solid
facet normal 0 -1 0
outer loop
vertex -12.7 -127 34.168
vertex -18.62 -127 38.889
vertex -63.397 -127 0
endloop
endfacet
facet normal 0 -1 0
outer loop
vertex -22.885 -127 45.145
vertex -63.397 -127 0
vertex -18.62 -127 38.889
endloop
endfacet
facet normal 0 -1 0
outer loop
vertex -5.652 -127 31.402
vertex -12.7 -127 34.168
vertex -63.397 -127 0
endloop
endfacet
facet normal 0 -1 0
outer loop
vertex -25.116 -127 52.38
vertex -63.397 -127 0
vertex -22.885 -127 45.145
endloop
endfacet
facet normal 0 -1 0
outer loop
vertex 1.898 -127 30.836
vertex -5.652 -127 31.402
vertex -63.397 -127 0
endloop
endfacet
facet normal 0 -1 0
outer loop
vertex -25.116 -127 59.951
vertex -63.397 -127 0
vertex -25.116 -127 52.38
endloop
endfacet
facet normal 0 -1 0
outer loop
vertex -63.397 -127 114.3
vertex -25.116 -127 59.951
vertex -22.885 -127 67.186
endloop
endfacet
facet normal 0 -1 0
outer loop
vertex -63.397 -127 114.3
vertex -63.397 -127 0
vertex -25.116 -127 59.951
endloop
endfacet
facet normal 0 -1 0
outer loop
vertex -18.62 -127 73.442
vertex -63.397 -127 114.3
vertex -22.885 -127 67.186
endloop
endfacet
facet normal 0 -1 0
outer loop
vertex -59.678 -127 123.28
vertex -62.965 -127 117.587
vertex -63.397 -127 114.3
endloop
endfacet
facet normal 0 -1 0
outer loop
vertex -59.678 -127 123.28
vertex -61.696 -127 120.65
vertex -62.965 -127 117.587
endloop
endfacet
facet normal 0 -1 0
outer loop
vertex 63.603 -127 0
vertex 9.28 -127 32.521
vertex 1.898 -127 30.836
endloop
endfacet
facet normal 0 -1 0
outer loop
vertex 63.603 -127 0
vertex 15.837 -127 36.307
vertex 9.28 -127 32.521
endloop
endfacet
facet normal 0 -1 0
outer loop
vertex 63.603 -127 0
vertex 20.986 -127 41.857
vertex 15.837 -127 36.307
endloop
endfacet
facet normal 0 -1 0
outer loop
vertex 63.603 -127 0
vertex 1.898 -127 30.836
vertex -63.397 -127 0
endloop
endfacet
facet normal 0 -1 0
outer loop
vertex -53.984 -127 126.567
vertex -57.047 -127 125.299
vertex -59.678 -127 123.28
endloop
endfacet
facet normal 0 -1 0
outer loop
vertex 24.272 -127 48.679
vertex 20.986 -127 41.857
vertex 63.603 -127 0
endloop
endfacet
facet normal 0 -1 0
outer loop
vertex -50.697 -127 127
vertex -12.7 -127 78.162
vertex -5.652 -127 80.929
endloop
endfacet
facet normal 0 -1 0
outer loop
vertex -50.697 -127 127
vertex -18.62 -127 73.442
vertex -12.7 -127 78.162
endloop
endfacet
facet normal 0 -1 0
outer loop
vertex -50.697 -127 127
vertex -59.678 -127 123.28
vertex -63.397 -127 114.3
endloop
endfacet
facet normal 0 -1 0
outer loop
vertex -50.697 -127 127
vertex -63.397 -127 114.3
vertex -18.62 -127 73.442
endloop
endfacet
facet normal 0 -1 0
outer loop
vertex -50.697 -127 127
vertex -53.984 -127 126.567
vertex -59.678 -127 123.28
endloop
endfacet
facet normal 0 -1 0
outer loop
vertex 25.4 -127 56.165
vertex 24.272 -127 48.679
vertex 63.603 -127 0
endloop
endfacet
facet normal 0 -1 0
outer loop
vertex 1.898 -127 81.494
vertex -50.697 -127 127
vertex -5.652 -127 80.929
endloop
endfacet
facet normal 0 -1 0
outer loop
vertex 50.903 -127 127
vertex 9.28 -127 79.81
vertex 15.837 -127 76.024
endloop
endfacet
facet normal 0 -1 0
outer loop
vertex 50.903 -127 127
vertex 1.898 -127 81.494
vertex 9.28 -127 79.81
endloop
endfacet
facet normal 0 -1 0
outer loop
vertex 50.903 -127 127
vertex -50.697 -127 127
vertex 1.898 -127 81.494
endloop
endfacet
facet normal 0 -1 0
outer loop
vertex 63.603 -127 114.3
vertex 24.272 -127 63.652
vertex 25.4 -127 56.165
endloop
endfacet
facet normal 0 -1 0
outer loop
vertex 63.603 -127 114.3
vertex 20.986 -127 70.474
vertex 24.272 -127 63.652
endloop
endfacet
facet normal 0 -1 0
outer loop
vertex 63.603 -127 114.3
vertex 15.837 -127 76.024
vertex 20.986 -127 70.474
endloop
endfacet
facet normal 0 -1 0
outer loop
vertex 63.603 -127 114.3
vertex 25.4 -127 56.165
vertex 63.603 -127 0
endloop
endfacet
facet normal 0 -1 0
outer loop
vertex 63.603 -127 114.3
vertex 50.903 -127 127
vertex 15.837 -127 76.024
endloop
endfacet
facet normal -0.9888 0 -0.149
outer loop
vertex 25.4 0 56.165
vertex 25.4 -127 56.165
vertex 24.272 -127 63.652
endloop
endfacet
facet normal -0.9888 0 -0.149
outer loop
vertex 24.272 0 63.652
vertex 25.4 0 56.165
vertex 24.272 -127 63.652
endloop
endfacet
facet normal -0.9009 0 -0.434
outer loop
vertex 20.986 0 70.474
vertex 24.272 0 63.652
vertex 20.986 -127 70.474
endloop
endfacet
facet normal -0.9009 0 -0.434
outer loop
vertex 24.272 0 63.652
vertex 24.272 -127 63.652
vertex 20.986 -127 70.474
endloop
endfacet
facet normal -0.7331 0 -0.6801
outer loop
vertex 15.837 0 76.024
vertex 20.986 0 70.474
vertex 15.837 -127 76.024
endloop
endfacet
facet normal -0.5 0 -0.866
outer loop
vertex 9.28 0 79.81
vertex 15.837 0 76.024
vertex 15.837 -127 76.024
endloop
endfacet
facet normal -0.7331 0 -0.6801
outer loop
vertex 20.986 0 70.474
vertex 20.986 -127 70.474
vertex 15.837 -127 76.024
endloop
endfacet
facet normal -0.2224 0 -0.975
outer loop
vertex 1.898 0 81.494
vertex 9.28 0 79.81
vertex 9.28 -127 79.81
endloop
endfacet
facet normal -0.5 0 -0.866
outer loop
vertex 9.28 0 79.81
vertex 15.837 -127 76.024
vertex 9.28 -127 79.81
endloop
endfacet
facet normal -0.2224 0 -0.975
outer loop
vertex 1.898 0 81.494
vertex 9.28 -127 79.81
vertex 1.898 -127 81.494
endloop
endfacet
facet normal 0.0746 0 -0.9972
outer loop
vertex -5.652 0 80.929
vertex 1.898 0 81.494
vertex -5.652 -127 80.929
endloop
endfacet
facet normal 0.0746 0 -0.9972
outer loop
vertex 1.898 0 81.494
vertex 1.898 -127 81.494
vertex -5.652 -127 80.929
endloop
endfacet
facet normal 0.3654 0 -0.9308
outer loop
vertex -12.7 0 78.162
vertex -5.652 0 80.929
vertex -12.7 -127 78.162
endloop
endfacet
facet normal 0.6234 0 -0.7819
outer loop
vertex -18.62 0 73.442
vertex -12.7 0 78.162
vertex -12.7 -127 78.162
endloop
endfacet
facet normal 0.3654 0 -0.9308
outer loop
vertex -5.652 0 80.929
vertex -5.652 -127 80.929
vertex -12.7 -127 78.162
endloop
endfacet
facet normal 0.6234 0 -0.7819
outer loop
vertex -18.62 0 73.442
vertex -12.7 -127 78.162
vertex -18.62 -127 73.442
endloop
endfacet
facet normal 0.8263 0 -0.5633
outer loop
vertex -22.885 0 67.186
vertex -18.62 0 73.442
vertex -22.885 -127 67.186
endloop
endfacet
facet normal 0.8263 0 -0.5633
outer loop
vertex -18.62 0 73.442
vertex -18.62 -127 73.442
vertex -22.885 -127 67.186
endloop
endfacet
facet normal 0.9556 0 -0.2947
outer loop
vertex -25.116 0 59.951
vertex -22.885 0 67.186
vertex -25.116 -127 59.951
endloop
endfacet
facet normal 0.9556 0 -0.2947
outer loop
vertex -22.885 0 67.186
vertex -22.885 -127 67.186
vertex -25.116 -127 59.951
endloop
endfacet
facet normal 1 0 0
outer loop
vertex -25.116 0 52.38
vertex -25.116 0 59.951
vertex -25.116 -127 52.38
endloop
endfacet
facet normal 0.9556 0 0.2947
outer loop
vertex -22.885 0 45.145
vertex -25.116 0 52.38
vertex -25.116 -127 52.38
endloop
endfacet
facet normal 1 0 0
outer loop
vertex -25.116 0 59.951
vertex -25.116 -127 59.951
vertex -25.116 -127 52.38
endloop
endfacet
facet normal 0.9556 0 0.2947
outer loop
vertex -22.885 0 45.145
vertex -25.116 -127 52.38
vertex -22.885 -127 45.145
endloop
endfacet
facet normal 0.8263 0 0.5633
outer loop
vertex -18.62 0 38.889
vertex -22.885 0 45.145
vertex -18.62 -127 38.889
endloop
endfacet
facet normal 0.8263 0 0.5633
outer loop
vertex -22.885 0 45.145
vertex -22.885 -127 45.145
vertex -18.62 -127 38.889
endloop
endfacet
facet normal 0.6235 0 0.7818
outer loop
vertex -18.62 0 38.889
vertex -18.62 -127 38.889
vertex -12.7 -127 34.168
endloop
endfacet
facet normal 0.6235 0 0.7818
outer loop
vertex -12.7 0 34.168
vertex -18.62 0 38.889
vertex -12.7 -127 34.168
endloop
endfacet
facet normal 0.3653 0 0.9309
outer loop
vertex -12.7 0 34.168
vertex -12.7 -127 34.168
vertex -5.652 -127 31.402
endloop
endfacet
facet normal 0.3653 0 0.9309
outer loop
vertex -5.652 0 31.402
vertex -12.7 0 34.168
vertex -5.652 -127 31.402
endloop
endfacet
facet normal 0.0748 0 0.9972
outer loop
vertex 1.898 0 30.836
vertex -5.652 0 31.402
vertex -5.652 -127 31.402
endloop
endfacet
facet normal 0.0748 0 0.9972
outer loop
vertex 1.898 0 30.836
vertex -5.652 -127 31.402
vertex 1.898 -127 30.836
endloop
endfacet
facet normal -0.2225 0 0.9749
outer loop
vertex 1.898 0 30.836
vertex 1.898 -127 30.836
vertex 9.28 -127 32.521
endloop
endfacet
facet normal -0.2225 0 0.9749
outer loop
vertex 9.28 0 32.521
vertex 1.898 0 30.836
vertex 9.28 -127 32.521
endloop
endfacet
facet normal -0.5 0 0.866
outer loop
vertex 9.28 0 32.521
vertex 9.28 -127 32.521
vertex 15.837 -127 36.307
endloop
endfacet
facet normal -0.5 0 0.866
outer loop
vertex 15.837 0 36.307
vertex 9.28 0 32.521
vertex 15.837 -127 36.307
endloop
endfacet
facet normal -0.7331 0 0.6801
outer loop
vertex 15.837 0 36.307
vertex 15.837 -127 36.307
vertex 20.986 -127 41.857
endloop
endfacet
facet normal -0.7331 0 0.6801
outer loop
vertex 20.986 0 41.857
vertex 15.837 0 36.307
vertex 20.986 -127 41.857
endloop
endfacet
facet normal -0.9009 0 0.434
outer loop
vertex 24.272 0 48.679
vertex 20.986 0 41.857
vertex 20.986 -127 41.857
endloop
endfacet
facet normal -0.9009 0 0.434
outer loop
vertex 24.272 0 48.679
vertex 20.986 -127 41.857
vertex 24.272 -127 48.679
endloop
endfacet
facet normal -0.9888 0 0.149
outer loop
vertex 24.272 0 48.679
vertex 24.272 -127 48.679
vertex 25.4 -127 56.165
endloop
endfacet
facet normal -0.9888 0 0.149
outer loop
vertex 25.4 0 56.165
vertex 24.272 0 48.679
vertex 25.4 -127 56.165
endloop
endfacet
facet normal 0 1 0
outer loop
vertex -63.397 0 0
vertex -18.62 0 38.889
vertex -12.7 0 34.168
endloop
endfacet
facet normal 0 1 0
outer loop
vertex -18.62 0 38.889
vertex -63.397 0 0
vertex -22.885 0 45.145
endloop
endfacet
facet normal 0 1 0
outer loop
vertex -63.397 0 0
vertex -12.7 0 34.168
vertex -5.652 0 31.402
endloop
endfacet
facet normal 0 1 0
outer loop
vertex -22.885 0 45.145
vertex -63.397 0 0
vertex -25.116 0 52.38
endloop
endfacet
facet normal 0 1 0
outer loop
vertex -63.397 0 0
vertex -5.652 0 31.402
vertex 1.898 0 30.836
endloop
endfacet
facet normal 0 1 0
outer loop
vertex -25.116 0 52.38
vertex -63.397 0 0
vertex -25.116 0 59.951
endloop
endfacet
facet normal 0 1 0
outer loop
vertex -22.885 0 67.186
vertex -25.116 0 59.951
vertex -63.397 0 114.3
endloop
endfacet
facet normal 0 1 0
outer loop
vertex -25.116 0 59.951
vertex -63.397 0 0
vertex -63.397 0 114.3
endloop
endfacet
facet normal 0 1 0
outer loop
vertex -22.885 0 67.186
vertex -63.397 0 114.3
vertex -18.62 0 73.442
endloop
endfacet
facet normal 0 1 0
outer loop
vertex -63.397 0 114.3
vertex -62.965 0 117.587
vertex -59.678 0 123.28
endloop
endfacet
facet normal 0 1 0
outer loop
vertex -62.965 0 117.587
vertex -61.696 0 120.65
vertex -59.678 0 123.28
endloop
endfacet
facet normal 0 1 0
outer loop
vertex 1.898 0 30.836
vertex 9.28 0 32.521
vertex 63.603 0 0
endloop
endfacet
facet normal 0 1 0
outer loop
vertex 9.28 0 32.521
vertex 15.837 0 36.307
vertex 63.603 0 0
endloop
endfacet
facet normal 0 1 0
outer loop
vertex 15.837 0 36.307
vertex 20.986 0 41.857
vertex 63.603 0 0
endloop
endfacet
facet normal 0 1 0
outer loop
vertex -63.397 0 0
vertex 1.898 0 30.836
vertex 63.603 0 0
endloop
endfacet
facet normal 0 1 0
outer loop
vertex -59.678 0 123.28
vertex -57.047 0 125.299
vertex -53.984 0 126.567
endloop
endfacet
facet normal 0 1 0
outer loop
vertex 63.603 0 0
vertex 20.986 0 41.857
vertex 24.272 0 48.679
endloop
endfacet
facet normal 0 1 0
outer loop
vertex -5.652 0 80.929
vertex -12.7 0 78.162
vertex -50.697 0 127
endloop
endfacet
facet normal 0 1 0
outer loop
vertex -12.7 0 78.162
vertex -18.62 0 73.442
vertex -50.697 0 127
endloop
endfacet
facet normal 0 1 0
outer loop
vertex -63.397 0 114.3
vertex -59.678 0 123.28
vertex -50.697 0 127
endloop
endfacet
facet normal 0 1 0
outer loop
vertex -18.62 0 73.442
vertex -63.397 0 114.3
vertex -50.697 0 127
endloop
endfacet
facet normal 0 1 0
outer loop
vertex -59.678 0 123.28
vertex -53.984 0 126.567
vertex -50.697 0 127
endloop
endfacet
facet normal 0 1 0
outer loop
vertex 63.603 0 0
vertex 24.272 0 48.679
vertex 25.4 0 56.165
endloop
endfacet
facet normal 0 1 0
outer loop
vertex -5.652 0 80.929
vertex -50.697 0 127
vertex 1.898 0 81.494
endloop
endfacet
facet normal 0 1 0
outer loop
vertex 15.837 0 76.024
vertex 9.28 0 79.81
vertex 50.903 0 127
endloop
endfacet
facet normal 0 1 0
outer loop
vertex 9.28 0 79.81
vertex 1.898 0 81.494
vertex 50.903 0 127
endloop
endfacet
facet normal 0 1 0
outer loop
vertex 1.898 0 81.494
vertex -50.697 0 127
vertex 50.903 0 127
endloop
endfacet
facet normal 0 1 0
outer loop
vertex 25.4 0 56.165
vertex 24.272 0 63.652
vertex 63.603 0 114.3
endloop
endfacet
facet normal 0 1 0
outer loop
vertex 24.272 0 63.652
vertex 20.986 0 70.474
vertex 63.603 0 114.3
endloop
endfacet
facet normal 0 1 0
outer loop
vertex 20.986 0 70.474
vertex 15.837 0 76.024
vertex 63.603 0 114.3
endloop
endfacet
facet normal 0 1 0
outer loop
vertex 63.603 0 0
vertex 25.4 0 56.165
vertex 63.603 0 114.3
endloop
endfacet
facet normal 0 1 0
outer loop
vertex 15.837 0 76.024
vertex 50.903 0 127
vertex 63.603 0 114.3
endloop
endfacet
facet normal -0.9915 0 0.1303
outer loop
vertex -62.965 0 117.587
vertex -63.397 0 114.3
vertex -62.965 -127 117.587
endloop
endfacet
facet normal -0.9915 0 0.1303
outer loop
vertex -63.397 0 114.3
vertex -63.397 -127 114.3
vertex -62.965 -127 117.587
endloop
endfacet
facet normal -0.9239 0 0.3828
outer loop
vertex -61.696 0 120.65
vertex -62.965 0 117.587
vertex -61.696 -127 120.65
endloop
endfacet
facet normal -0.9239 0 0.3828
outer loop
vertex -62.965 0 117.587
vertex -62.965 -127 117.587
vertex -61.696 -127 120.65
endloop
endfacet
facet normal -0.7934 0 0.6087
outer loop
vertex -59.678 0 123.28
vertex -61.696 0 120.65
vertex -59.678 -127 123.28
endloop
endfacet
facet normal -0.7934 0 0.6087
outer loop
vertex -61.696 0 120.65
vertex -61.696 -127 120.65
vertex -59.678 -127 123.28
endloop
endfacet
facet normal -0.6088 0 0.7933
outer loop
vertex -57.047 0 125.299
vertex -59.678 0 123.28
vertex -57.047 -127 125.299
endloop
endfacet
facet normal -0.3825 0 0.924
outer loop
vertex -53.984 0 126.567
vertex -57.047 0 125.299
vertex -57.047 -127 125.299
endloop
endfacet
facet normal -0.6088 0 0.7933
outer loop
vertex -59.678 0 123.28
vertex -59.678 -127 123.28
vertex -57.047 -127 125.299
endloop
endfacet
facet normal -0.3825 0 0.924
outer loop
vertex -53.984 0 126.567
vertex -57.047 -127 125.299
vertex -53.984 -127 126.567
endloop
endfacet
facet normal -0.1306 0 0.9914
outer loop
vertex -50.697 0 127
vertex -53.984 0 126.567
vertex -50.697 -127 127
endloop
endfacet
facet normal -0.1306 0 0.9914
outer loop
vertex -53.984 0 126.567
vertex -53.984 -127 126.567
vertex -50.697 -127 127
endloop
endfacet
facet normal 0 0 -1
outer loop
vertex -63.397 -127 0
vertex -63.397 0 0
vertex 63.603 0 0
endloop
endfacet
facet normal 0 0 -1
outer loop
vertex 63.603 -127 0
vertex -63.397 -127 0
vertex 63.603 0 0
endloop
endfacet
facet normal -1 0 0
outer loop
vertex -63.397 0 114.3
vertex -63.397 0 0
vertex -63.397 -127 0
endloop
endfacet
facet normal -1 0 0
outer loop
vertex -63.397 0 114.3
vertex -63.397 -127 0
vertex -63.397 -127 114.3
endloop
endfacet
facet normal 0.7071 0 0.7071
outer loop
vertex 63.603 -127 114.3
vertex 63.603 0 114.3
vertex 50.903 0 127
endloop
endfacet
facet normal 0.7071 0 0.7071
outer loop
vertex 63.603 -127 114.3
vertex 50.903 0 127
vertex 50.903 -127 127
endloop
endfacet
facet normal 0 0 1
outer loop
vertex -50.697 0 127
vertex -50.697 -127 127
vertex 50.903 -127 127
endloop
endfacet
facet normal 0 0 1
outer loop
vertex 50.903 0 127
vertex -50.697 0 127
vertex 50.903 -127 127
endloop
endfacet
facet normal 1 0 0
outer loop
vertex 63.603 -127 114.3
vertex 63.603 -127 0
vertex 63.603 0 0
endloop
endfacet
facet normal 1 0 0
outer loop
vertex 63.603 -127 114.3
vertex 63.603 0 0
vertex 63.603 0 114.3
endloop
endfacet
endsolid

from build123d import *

# Parameters (mm, degrees)
F0_W     = 127
F0_H     = 127
F1_DEPTH = 127
F2_R     = 12.7
F3_SIZE  = 12.7
F5_R     = 25.4
F6_DEPTH = 127.001


with BuildPart() as f1:
    # F0 (on Front) → F1 (new body)
    with BuildSketch(Plane.XZ):
        with Locations((0.102586, 63.5)):
            Rectangle(F0_W, F0_H)
    extrude(amount=F1_DEPTH)

    # F2
    f2_edges = [f1.edges().sort_by_distance(p)[0] for p in [
        (-63.397414, -63.5, 127),
    ]]
    fillet(f2_edges, radius=F2_R)

    # F3
    f3_edges = [f1.edges().sort_by_distance(p)[0] for p in [
        (63.602586, -63.5, 127),
    ]]
    chamfer(f3_edges, length=F3_SIZE)

    # F5 (on face) → F6 (cut, through all)
    with BuildSketch(Plane.XZ.offset(127)):
        with Locations((0, 56.165393)):
            Circle(F5_R)
    extrude(amount=-F6_DEPTH, mode=Mode.SUBTRACT)


solid = f1.part
